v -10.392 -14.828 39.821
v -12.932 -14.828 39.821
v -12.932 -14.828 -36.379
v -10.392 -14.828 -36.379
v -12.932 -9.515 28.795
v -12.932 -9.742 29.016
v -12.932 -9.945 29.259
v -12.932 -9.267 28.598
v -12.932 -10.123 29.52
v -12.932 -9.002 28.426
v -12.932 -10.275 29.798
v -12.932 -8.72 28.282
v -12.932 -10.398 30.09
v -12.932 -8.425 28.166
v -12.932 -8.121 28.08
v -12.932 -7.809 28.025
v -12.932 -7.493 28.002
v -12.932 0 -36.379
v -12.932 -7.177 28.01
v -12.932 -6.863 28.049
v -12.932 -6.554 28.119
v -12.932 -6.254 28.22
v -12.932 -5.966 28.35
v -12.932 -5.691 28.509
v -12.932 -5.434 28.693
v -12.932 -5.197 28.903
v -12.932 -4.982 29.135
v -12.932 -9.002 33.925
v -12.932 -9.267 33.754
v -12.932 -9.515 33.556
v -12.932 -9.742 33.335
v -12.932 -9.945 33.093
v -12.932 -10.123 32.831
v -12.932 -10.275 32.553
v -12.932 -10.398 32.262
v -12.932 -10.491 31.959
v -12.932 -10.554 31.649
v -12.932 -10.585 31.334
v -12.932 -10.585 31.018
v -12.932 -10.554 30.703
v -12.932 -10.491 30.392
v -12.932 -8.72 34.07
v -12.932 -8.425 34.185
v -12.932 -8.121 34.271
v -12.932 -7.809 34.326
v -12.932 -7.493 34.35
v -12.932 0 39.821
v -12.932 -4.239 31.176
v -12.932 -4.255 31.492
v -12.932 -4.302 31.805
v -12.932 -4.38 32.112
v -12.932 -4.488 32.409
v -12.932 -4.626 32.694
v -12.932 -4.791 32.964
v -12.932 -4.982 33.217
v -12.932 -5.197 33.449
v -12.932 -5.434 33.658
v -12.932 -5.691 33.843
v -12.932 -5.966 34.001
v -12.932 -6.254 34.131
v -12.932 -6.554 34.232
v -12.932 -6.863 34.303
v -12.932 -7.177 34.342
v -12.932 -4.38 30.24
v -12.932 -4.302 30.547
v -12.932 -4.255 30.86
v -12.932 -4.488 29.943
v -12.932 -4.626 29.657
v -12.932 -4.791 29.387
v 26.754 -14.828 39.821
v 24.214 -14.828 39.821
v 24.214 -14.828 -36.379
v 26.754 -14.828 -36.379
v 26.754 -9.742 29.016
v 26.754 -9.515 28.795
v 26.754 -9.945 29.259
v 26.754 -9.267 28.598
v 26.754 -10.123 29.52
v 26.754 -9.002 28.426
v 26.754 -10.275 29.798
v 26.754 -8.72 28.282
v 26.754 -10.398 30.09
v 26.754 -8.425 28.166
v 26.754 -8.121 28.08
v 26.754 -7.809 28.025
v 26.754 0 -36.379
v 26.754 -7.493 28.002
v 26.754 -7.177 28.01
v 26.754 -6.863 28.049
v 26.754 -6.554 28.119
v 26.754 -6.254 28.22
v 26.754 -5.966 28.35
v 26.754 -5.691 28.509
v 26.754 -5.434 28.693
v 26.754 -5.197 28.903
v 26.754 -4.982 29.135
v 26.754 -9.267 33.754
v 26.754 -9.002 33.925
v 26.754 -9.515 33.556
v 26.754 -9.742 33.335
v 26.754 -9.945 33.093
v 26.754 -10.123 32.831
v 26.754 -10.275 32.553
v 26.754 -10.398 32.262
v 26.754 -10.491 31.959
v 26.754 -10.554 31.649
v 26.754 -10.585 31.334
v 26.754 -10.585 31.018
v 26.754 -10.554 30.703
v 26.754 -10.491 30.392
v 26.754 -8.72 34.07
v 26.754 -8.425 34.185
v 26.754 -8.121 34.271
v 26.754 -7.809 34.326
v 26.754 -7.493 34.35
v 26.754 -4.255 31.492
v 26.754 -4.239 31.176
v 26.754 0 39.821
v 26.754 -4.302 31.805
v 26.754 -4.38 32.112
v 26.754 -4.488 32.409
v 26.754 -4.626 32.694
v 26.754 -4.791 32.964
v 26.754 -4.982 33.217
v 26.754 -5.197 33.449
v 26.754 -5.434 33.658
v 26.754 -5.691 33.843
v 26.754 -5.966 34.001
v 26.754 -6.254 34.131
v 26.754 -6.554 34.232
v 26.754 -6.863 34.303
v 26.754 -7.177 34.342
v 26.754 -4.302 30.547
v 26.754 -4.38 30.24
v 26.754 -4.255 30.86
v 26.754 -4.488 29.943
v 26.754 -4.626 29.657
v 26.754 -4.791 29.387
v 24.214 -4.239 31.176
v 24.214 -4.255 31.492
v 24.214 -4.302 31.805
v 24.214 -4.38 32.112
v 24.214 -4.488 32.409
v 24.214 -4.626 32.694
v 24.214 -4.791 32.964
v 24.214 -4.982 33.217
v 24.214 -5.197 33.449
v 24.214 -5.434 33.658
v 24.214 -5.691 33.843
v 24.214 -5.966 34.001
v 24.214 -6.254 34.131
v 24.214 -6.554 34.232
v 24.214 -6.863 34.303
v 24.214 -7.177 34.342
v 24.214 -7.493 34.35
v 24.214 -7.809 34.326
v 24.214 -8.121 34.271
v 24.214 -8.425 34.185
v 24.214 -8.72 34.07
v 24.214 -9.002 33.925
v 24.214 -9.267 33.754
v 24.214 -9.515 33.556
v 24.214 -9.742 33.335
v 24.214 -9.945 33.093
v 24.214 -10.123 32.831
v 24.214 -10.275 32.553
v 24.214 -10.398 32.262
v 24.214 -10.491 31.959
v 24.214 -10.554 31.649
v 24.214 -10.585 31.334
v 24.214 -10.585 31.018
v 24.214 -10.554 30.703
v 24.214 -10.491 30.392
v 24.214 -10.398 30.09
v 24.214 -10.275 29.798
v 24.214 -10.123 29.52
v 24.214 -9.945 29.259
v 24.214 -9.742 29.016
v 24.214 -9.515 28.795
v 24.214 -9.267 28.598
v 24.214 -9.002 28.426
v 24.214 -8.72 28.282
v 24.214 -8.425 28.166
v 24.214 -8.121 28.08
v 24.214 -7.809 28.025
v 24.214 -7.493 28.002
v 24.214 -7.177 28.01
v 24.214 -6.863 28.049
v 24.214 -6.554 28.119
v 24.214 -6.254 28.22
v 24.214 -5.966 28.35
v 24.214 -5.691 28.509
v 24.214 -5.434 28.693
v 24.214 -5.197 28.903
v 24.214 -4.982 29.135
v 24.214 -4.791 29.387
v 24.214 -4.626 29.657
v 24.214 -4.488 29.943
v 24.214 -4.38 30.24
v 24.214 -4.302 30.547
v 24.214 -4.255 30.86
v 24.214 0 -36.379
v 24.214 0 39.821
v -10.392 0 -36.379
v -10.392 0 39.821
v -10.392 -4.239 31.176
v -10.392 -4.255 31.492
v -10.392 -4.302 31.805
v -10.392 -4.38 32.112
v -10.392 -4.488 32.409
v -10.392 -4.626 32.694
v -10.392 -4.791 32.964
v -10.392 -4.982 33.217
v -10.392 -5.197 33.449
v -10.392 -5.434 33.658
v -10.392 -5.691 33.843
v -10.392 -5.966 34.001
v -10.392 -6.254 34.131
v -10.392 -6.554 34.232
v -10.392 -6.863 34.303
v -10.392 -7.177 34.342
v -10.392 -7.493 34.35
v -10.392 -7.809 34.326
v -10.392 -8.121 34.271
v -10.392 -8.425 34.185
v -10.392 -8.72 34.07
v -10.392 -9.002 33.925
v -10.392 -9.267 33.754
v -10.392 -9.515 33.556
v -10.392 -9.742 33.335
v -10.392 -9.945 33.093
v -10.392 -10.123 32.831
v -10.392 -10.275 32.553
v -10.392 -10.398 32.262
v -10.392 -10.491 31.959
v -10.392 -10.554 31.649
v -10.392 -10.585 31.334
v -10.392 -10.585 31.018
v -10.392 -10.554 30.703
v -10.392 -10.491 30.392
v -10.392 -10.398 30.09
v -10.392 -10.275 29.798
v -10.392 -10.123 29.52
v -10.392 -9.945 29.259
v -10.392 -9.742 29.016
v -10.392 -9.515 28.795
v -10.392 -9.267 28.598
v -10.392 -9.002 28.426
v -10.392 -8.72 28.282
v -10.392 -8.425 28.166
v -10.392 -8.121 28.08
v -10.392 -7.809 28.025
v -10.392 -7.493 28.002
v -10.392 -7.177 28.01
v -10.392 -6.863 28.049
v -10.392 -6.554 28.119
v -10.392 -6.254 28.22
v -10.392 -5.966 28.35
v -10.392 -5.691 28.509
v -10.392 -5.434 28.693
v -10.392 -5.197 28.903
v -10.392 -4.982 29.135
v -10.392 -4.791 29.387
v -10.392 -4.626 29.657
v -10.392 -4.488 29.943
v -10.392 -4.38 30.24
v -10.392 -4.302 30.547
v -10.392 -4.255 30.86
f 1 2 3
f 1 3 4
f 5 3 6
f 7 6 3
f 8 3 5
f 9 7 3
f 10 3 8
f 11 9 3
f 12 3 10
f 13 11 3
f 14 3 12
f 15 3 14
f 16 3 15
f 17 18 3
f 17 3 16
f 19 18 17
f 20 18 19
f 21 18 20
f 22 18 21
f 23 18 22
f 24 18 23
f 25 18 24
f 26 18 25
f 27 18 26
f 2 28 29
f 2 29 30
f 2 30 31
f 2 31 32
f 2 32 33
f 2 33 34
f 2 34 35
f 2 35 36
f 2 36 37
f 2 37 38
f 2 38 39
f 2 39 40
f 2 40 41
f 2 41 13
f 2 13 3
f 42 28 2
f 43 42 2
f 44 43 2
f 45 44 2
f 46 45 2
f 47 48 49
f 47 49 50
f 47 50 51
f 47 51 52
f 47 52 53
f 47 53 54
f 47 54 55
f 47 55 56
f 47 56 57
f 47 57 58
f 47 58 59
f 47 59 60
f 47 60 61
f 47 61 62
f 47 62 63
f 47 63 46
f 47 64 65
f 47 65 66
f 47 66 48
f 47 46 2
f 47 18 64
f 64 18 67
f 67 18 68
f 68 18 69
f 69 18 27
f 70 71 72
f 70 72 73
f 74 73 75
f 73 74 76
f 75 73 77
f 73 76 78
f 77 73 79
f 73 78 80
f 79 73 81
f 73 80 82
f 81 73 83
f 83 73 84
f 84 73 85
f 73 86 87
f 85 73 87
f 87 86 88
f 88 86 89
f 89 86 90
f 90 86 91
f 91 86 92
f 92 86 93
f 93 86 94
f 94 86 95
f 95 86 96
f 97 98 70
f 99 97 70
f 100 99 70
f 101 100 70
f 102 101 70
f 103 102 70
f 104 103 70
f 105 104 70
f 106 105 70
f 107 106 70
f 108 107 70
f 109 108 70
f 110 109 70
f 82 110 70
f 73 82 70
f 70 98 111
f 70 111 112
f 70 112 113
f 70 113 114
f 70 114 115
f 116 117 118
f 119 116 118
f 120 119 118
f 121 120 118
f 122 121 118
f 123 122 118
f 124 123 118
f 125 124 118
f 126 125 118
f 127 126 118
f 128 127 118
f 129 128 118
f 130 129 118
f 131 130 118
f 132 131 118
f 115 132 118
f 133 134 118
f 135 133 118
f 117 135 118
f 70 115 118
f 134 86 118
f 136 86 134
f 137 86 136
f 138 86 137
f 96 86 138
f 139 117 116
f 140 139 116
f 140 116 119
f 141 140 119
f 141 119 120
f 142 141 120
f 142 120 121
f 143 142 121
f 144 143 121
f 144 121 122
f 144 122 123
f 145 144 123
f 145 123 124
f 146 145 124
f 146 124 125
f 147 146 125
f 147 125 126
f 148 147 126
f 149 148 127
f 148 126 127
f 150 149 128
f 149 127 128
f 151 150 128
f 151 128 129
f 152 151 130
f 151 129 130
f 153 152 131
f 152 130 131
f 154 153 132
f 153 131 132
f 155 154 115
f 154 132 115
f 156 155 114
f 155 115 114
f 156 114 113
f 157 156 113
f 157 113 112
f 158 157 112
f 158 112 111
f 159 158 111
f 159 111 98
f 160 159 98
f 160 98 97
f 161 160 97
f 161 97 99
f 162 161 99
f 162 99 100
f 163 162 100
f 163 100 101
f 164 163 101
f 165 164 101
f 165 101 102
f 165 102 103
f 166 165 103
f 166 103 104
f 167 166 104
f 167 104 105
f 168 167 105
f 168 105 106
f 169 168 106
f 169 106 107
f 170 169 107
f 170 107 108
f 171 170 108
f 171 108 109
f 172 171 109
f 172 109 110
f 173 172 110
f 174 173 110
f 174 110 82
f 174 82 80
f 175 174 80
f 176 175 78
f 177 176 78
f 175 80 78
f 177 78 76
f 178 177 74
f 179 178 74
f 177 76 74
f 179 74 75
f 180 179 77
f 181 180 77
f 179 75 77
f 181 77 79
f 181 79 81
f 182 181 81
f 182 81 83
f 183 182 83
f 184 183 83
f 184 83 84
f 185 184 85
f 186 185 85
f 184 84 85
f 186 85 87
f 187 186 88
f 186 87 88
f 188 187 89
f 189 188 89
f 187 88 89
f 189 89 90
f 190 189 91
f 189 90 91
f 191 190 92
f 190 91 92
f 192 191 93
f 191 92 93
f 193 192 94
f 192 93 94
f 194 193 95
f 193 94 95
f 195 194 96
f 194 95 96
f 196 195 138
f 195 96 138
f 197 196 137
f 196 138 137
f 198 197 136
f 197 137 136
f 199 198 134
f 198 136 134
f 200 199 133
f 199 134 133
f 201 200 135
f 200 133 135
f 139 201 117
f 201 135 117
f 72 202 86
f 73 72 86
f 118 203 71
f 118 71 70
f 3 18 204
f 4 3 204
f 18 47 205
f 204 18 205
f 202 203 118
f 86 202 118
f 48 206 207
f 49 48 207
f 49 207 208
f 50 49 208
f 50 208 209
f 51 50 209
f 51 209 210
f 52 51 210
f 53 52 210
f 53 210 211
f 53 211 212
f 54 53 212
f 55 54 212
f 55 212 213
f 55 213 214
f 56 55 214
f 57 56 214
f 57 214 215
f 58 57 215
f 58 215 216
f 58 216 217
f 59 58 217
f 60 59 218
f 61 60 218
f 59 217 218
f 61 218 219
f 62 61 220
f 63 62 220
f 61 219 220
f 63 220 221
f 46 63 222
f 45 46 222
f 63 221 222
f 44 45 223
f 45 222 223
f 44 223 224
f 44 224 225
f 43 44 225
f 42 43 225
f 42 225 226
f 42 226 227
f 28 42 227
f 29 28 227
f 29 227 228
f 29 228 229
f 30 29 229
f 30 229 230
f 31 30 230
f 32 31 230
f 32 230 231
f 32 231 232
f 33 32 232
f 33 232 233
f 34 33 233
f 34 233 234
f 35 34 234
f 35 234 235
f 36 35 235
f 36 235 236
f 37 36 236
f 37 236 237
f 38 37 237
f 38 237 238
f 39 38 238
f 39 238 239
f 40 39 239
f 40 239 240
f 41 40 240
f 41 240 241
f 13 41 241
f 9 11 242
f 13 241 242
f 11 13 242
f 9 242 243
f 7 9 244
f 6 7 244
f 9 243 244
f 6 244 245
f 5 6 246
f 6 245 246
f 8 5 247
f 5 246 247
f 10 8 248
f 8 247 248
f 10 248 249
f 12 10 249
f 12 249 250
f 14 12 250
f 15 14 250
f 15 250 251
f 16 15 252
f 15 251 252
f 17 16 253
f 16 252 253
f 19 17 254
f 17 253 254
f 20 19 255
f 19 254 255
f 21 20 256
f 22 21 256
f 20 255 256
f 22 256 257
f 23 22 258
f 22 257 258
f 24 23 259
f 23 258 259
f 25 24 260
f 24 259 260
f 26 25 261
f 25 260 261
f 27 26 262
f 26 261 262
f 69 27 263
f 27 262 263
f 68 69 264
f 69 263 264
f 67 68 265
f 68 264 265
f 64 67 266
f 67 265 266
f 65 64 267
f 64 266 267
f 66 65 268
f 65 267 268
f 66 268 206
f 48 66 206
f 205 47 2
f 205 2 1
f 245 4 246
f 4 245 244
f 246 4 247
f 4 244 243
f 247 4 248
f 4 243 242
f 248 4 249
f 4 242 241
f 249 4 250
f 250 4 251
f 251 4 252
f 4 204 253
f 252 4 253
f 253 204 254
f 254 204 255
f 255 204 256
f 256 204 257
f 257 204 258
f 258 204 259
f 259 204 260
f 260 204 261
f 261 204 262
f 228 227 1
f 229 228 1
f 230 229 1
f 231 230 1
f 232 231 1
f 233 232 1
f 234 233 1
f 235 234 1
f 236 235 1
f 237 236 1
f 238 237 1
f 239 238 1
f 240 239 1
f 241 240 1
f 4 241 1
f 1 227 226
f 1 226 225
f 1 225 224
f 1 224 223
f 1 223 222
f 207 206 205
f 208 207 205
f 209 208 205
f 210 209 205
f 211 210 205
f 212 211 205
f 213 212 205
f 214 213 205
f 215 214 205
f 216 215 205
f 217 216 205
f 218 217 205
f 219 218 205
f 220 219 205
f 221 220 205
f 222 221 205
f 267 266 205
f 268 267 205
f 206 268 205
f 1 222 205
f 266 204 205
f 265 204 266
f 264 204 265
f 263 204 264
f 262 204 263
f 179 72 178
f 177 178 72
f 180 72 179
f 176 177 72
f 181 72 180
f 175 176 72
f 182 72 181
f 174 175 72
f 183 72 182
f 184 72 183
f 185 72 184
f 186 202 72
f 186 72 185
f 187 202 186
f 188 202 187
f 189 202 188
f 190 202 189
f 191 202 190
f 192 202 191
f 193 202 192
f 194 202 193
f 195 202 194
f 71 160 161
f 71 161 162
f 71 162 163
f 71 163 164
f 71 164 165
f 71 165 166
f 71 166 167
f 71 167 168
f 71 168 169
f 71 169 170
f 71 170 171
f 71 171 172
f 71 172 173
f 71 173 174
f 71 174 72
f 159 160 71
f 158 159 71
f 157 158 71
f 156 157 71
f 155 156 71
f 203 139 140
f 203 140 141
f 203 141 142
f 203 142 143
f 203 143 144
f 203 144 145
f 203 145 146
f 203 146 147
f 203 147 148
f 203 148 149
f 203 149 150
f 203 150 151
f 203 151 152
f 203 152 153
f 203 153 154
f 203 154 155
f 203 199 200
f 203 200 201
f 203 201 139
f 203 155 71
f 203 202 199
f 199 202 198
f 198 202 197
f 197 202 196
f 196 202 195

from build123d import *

# Parameters (mm, degrees)
F0_W     = 2.54
F0_H     = 76.2
F1_DEPTH = 14.82815
F2_R     = 3.175
F3_DEPTH = 50.97066


with BuildPart() as f1:
    # F0 (on Front) → F1 (new body)
    with BuildSketch(Plane.XZ):
        with Locations((-11.661849, 1.721145)):
            Rectangle(F0_W, F0_H)
        with Locations((25.483701, 1.721145)):
            Rectangle(F0_W, F0_H)
    extrude(amount=F1_DEPTH)

    # F2 (on face) → F3 (cut)
    with BuildSketch(Plane.YZ.offset(26.753701)):
        with Locations((-7.414075, 31.175798)):
            Circle(F2_R)
    extrude(amount=-F3_DEPTH, mode=Mode.SUBTRACT)


solid = f1.part
